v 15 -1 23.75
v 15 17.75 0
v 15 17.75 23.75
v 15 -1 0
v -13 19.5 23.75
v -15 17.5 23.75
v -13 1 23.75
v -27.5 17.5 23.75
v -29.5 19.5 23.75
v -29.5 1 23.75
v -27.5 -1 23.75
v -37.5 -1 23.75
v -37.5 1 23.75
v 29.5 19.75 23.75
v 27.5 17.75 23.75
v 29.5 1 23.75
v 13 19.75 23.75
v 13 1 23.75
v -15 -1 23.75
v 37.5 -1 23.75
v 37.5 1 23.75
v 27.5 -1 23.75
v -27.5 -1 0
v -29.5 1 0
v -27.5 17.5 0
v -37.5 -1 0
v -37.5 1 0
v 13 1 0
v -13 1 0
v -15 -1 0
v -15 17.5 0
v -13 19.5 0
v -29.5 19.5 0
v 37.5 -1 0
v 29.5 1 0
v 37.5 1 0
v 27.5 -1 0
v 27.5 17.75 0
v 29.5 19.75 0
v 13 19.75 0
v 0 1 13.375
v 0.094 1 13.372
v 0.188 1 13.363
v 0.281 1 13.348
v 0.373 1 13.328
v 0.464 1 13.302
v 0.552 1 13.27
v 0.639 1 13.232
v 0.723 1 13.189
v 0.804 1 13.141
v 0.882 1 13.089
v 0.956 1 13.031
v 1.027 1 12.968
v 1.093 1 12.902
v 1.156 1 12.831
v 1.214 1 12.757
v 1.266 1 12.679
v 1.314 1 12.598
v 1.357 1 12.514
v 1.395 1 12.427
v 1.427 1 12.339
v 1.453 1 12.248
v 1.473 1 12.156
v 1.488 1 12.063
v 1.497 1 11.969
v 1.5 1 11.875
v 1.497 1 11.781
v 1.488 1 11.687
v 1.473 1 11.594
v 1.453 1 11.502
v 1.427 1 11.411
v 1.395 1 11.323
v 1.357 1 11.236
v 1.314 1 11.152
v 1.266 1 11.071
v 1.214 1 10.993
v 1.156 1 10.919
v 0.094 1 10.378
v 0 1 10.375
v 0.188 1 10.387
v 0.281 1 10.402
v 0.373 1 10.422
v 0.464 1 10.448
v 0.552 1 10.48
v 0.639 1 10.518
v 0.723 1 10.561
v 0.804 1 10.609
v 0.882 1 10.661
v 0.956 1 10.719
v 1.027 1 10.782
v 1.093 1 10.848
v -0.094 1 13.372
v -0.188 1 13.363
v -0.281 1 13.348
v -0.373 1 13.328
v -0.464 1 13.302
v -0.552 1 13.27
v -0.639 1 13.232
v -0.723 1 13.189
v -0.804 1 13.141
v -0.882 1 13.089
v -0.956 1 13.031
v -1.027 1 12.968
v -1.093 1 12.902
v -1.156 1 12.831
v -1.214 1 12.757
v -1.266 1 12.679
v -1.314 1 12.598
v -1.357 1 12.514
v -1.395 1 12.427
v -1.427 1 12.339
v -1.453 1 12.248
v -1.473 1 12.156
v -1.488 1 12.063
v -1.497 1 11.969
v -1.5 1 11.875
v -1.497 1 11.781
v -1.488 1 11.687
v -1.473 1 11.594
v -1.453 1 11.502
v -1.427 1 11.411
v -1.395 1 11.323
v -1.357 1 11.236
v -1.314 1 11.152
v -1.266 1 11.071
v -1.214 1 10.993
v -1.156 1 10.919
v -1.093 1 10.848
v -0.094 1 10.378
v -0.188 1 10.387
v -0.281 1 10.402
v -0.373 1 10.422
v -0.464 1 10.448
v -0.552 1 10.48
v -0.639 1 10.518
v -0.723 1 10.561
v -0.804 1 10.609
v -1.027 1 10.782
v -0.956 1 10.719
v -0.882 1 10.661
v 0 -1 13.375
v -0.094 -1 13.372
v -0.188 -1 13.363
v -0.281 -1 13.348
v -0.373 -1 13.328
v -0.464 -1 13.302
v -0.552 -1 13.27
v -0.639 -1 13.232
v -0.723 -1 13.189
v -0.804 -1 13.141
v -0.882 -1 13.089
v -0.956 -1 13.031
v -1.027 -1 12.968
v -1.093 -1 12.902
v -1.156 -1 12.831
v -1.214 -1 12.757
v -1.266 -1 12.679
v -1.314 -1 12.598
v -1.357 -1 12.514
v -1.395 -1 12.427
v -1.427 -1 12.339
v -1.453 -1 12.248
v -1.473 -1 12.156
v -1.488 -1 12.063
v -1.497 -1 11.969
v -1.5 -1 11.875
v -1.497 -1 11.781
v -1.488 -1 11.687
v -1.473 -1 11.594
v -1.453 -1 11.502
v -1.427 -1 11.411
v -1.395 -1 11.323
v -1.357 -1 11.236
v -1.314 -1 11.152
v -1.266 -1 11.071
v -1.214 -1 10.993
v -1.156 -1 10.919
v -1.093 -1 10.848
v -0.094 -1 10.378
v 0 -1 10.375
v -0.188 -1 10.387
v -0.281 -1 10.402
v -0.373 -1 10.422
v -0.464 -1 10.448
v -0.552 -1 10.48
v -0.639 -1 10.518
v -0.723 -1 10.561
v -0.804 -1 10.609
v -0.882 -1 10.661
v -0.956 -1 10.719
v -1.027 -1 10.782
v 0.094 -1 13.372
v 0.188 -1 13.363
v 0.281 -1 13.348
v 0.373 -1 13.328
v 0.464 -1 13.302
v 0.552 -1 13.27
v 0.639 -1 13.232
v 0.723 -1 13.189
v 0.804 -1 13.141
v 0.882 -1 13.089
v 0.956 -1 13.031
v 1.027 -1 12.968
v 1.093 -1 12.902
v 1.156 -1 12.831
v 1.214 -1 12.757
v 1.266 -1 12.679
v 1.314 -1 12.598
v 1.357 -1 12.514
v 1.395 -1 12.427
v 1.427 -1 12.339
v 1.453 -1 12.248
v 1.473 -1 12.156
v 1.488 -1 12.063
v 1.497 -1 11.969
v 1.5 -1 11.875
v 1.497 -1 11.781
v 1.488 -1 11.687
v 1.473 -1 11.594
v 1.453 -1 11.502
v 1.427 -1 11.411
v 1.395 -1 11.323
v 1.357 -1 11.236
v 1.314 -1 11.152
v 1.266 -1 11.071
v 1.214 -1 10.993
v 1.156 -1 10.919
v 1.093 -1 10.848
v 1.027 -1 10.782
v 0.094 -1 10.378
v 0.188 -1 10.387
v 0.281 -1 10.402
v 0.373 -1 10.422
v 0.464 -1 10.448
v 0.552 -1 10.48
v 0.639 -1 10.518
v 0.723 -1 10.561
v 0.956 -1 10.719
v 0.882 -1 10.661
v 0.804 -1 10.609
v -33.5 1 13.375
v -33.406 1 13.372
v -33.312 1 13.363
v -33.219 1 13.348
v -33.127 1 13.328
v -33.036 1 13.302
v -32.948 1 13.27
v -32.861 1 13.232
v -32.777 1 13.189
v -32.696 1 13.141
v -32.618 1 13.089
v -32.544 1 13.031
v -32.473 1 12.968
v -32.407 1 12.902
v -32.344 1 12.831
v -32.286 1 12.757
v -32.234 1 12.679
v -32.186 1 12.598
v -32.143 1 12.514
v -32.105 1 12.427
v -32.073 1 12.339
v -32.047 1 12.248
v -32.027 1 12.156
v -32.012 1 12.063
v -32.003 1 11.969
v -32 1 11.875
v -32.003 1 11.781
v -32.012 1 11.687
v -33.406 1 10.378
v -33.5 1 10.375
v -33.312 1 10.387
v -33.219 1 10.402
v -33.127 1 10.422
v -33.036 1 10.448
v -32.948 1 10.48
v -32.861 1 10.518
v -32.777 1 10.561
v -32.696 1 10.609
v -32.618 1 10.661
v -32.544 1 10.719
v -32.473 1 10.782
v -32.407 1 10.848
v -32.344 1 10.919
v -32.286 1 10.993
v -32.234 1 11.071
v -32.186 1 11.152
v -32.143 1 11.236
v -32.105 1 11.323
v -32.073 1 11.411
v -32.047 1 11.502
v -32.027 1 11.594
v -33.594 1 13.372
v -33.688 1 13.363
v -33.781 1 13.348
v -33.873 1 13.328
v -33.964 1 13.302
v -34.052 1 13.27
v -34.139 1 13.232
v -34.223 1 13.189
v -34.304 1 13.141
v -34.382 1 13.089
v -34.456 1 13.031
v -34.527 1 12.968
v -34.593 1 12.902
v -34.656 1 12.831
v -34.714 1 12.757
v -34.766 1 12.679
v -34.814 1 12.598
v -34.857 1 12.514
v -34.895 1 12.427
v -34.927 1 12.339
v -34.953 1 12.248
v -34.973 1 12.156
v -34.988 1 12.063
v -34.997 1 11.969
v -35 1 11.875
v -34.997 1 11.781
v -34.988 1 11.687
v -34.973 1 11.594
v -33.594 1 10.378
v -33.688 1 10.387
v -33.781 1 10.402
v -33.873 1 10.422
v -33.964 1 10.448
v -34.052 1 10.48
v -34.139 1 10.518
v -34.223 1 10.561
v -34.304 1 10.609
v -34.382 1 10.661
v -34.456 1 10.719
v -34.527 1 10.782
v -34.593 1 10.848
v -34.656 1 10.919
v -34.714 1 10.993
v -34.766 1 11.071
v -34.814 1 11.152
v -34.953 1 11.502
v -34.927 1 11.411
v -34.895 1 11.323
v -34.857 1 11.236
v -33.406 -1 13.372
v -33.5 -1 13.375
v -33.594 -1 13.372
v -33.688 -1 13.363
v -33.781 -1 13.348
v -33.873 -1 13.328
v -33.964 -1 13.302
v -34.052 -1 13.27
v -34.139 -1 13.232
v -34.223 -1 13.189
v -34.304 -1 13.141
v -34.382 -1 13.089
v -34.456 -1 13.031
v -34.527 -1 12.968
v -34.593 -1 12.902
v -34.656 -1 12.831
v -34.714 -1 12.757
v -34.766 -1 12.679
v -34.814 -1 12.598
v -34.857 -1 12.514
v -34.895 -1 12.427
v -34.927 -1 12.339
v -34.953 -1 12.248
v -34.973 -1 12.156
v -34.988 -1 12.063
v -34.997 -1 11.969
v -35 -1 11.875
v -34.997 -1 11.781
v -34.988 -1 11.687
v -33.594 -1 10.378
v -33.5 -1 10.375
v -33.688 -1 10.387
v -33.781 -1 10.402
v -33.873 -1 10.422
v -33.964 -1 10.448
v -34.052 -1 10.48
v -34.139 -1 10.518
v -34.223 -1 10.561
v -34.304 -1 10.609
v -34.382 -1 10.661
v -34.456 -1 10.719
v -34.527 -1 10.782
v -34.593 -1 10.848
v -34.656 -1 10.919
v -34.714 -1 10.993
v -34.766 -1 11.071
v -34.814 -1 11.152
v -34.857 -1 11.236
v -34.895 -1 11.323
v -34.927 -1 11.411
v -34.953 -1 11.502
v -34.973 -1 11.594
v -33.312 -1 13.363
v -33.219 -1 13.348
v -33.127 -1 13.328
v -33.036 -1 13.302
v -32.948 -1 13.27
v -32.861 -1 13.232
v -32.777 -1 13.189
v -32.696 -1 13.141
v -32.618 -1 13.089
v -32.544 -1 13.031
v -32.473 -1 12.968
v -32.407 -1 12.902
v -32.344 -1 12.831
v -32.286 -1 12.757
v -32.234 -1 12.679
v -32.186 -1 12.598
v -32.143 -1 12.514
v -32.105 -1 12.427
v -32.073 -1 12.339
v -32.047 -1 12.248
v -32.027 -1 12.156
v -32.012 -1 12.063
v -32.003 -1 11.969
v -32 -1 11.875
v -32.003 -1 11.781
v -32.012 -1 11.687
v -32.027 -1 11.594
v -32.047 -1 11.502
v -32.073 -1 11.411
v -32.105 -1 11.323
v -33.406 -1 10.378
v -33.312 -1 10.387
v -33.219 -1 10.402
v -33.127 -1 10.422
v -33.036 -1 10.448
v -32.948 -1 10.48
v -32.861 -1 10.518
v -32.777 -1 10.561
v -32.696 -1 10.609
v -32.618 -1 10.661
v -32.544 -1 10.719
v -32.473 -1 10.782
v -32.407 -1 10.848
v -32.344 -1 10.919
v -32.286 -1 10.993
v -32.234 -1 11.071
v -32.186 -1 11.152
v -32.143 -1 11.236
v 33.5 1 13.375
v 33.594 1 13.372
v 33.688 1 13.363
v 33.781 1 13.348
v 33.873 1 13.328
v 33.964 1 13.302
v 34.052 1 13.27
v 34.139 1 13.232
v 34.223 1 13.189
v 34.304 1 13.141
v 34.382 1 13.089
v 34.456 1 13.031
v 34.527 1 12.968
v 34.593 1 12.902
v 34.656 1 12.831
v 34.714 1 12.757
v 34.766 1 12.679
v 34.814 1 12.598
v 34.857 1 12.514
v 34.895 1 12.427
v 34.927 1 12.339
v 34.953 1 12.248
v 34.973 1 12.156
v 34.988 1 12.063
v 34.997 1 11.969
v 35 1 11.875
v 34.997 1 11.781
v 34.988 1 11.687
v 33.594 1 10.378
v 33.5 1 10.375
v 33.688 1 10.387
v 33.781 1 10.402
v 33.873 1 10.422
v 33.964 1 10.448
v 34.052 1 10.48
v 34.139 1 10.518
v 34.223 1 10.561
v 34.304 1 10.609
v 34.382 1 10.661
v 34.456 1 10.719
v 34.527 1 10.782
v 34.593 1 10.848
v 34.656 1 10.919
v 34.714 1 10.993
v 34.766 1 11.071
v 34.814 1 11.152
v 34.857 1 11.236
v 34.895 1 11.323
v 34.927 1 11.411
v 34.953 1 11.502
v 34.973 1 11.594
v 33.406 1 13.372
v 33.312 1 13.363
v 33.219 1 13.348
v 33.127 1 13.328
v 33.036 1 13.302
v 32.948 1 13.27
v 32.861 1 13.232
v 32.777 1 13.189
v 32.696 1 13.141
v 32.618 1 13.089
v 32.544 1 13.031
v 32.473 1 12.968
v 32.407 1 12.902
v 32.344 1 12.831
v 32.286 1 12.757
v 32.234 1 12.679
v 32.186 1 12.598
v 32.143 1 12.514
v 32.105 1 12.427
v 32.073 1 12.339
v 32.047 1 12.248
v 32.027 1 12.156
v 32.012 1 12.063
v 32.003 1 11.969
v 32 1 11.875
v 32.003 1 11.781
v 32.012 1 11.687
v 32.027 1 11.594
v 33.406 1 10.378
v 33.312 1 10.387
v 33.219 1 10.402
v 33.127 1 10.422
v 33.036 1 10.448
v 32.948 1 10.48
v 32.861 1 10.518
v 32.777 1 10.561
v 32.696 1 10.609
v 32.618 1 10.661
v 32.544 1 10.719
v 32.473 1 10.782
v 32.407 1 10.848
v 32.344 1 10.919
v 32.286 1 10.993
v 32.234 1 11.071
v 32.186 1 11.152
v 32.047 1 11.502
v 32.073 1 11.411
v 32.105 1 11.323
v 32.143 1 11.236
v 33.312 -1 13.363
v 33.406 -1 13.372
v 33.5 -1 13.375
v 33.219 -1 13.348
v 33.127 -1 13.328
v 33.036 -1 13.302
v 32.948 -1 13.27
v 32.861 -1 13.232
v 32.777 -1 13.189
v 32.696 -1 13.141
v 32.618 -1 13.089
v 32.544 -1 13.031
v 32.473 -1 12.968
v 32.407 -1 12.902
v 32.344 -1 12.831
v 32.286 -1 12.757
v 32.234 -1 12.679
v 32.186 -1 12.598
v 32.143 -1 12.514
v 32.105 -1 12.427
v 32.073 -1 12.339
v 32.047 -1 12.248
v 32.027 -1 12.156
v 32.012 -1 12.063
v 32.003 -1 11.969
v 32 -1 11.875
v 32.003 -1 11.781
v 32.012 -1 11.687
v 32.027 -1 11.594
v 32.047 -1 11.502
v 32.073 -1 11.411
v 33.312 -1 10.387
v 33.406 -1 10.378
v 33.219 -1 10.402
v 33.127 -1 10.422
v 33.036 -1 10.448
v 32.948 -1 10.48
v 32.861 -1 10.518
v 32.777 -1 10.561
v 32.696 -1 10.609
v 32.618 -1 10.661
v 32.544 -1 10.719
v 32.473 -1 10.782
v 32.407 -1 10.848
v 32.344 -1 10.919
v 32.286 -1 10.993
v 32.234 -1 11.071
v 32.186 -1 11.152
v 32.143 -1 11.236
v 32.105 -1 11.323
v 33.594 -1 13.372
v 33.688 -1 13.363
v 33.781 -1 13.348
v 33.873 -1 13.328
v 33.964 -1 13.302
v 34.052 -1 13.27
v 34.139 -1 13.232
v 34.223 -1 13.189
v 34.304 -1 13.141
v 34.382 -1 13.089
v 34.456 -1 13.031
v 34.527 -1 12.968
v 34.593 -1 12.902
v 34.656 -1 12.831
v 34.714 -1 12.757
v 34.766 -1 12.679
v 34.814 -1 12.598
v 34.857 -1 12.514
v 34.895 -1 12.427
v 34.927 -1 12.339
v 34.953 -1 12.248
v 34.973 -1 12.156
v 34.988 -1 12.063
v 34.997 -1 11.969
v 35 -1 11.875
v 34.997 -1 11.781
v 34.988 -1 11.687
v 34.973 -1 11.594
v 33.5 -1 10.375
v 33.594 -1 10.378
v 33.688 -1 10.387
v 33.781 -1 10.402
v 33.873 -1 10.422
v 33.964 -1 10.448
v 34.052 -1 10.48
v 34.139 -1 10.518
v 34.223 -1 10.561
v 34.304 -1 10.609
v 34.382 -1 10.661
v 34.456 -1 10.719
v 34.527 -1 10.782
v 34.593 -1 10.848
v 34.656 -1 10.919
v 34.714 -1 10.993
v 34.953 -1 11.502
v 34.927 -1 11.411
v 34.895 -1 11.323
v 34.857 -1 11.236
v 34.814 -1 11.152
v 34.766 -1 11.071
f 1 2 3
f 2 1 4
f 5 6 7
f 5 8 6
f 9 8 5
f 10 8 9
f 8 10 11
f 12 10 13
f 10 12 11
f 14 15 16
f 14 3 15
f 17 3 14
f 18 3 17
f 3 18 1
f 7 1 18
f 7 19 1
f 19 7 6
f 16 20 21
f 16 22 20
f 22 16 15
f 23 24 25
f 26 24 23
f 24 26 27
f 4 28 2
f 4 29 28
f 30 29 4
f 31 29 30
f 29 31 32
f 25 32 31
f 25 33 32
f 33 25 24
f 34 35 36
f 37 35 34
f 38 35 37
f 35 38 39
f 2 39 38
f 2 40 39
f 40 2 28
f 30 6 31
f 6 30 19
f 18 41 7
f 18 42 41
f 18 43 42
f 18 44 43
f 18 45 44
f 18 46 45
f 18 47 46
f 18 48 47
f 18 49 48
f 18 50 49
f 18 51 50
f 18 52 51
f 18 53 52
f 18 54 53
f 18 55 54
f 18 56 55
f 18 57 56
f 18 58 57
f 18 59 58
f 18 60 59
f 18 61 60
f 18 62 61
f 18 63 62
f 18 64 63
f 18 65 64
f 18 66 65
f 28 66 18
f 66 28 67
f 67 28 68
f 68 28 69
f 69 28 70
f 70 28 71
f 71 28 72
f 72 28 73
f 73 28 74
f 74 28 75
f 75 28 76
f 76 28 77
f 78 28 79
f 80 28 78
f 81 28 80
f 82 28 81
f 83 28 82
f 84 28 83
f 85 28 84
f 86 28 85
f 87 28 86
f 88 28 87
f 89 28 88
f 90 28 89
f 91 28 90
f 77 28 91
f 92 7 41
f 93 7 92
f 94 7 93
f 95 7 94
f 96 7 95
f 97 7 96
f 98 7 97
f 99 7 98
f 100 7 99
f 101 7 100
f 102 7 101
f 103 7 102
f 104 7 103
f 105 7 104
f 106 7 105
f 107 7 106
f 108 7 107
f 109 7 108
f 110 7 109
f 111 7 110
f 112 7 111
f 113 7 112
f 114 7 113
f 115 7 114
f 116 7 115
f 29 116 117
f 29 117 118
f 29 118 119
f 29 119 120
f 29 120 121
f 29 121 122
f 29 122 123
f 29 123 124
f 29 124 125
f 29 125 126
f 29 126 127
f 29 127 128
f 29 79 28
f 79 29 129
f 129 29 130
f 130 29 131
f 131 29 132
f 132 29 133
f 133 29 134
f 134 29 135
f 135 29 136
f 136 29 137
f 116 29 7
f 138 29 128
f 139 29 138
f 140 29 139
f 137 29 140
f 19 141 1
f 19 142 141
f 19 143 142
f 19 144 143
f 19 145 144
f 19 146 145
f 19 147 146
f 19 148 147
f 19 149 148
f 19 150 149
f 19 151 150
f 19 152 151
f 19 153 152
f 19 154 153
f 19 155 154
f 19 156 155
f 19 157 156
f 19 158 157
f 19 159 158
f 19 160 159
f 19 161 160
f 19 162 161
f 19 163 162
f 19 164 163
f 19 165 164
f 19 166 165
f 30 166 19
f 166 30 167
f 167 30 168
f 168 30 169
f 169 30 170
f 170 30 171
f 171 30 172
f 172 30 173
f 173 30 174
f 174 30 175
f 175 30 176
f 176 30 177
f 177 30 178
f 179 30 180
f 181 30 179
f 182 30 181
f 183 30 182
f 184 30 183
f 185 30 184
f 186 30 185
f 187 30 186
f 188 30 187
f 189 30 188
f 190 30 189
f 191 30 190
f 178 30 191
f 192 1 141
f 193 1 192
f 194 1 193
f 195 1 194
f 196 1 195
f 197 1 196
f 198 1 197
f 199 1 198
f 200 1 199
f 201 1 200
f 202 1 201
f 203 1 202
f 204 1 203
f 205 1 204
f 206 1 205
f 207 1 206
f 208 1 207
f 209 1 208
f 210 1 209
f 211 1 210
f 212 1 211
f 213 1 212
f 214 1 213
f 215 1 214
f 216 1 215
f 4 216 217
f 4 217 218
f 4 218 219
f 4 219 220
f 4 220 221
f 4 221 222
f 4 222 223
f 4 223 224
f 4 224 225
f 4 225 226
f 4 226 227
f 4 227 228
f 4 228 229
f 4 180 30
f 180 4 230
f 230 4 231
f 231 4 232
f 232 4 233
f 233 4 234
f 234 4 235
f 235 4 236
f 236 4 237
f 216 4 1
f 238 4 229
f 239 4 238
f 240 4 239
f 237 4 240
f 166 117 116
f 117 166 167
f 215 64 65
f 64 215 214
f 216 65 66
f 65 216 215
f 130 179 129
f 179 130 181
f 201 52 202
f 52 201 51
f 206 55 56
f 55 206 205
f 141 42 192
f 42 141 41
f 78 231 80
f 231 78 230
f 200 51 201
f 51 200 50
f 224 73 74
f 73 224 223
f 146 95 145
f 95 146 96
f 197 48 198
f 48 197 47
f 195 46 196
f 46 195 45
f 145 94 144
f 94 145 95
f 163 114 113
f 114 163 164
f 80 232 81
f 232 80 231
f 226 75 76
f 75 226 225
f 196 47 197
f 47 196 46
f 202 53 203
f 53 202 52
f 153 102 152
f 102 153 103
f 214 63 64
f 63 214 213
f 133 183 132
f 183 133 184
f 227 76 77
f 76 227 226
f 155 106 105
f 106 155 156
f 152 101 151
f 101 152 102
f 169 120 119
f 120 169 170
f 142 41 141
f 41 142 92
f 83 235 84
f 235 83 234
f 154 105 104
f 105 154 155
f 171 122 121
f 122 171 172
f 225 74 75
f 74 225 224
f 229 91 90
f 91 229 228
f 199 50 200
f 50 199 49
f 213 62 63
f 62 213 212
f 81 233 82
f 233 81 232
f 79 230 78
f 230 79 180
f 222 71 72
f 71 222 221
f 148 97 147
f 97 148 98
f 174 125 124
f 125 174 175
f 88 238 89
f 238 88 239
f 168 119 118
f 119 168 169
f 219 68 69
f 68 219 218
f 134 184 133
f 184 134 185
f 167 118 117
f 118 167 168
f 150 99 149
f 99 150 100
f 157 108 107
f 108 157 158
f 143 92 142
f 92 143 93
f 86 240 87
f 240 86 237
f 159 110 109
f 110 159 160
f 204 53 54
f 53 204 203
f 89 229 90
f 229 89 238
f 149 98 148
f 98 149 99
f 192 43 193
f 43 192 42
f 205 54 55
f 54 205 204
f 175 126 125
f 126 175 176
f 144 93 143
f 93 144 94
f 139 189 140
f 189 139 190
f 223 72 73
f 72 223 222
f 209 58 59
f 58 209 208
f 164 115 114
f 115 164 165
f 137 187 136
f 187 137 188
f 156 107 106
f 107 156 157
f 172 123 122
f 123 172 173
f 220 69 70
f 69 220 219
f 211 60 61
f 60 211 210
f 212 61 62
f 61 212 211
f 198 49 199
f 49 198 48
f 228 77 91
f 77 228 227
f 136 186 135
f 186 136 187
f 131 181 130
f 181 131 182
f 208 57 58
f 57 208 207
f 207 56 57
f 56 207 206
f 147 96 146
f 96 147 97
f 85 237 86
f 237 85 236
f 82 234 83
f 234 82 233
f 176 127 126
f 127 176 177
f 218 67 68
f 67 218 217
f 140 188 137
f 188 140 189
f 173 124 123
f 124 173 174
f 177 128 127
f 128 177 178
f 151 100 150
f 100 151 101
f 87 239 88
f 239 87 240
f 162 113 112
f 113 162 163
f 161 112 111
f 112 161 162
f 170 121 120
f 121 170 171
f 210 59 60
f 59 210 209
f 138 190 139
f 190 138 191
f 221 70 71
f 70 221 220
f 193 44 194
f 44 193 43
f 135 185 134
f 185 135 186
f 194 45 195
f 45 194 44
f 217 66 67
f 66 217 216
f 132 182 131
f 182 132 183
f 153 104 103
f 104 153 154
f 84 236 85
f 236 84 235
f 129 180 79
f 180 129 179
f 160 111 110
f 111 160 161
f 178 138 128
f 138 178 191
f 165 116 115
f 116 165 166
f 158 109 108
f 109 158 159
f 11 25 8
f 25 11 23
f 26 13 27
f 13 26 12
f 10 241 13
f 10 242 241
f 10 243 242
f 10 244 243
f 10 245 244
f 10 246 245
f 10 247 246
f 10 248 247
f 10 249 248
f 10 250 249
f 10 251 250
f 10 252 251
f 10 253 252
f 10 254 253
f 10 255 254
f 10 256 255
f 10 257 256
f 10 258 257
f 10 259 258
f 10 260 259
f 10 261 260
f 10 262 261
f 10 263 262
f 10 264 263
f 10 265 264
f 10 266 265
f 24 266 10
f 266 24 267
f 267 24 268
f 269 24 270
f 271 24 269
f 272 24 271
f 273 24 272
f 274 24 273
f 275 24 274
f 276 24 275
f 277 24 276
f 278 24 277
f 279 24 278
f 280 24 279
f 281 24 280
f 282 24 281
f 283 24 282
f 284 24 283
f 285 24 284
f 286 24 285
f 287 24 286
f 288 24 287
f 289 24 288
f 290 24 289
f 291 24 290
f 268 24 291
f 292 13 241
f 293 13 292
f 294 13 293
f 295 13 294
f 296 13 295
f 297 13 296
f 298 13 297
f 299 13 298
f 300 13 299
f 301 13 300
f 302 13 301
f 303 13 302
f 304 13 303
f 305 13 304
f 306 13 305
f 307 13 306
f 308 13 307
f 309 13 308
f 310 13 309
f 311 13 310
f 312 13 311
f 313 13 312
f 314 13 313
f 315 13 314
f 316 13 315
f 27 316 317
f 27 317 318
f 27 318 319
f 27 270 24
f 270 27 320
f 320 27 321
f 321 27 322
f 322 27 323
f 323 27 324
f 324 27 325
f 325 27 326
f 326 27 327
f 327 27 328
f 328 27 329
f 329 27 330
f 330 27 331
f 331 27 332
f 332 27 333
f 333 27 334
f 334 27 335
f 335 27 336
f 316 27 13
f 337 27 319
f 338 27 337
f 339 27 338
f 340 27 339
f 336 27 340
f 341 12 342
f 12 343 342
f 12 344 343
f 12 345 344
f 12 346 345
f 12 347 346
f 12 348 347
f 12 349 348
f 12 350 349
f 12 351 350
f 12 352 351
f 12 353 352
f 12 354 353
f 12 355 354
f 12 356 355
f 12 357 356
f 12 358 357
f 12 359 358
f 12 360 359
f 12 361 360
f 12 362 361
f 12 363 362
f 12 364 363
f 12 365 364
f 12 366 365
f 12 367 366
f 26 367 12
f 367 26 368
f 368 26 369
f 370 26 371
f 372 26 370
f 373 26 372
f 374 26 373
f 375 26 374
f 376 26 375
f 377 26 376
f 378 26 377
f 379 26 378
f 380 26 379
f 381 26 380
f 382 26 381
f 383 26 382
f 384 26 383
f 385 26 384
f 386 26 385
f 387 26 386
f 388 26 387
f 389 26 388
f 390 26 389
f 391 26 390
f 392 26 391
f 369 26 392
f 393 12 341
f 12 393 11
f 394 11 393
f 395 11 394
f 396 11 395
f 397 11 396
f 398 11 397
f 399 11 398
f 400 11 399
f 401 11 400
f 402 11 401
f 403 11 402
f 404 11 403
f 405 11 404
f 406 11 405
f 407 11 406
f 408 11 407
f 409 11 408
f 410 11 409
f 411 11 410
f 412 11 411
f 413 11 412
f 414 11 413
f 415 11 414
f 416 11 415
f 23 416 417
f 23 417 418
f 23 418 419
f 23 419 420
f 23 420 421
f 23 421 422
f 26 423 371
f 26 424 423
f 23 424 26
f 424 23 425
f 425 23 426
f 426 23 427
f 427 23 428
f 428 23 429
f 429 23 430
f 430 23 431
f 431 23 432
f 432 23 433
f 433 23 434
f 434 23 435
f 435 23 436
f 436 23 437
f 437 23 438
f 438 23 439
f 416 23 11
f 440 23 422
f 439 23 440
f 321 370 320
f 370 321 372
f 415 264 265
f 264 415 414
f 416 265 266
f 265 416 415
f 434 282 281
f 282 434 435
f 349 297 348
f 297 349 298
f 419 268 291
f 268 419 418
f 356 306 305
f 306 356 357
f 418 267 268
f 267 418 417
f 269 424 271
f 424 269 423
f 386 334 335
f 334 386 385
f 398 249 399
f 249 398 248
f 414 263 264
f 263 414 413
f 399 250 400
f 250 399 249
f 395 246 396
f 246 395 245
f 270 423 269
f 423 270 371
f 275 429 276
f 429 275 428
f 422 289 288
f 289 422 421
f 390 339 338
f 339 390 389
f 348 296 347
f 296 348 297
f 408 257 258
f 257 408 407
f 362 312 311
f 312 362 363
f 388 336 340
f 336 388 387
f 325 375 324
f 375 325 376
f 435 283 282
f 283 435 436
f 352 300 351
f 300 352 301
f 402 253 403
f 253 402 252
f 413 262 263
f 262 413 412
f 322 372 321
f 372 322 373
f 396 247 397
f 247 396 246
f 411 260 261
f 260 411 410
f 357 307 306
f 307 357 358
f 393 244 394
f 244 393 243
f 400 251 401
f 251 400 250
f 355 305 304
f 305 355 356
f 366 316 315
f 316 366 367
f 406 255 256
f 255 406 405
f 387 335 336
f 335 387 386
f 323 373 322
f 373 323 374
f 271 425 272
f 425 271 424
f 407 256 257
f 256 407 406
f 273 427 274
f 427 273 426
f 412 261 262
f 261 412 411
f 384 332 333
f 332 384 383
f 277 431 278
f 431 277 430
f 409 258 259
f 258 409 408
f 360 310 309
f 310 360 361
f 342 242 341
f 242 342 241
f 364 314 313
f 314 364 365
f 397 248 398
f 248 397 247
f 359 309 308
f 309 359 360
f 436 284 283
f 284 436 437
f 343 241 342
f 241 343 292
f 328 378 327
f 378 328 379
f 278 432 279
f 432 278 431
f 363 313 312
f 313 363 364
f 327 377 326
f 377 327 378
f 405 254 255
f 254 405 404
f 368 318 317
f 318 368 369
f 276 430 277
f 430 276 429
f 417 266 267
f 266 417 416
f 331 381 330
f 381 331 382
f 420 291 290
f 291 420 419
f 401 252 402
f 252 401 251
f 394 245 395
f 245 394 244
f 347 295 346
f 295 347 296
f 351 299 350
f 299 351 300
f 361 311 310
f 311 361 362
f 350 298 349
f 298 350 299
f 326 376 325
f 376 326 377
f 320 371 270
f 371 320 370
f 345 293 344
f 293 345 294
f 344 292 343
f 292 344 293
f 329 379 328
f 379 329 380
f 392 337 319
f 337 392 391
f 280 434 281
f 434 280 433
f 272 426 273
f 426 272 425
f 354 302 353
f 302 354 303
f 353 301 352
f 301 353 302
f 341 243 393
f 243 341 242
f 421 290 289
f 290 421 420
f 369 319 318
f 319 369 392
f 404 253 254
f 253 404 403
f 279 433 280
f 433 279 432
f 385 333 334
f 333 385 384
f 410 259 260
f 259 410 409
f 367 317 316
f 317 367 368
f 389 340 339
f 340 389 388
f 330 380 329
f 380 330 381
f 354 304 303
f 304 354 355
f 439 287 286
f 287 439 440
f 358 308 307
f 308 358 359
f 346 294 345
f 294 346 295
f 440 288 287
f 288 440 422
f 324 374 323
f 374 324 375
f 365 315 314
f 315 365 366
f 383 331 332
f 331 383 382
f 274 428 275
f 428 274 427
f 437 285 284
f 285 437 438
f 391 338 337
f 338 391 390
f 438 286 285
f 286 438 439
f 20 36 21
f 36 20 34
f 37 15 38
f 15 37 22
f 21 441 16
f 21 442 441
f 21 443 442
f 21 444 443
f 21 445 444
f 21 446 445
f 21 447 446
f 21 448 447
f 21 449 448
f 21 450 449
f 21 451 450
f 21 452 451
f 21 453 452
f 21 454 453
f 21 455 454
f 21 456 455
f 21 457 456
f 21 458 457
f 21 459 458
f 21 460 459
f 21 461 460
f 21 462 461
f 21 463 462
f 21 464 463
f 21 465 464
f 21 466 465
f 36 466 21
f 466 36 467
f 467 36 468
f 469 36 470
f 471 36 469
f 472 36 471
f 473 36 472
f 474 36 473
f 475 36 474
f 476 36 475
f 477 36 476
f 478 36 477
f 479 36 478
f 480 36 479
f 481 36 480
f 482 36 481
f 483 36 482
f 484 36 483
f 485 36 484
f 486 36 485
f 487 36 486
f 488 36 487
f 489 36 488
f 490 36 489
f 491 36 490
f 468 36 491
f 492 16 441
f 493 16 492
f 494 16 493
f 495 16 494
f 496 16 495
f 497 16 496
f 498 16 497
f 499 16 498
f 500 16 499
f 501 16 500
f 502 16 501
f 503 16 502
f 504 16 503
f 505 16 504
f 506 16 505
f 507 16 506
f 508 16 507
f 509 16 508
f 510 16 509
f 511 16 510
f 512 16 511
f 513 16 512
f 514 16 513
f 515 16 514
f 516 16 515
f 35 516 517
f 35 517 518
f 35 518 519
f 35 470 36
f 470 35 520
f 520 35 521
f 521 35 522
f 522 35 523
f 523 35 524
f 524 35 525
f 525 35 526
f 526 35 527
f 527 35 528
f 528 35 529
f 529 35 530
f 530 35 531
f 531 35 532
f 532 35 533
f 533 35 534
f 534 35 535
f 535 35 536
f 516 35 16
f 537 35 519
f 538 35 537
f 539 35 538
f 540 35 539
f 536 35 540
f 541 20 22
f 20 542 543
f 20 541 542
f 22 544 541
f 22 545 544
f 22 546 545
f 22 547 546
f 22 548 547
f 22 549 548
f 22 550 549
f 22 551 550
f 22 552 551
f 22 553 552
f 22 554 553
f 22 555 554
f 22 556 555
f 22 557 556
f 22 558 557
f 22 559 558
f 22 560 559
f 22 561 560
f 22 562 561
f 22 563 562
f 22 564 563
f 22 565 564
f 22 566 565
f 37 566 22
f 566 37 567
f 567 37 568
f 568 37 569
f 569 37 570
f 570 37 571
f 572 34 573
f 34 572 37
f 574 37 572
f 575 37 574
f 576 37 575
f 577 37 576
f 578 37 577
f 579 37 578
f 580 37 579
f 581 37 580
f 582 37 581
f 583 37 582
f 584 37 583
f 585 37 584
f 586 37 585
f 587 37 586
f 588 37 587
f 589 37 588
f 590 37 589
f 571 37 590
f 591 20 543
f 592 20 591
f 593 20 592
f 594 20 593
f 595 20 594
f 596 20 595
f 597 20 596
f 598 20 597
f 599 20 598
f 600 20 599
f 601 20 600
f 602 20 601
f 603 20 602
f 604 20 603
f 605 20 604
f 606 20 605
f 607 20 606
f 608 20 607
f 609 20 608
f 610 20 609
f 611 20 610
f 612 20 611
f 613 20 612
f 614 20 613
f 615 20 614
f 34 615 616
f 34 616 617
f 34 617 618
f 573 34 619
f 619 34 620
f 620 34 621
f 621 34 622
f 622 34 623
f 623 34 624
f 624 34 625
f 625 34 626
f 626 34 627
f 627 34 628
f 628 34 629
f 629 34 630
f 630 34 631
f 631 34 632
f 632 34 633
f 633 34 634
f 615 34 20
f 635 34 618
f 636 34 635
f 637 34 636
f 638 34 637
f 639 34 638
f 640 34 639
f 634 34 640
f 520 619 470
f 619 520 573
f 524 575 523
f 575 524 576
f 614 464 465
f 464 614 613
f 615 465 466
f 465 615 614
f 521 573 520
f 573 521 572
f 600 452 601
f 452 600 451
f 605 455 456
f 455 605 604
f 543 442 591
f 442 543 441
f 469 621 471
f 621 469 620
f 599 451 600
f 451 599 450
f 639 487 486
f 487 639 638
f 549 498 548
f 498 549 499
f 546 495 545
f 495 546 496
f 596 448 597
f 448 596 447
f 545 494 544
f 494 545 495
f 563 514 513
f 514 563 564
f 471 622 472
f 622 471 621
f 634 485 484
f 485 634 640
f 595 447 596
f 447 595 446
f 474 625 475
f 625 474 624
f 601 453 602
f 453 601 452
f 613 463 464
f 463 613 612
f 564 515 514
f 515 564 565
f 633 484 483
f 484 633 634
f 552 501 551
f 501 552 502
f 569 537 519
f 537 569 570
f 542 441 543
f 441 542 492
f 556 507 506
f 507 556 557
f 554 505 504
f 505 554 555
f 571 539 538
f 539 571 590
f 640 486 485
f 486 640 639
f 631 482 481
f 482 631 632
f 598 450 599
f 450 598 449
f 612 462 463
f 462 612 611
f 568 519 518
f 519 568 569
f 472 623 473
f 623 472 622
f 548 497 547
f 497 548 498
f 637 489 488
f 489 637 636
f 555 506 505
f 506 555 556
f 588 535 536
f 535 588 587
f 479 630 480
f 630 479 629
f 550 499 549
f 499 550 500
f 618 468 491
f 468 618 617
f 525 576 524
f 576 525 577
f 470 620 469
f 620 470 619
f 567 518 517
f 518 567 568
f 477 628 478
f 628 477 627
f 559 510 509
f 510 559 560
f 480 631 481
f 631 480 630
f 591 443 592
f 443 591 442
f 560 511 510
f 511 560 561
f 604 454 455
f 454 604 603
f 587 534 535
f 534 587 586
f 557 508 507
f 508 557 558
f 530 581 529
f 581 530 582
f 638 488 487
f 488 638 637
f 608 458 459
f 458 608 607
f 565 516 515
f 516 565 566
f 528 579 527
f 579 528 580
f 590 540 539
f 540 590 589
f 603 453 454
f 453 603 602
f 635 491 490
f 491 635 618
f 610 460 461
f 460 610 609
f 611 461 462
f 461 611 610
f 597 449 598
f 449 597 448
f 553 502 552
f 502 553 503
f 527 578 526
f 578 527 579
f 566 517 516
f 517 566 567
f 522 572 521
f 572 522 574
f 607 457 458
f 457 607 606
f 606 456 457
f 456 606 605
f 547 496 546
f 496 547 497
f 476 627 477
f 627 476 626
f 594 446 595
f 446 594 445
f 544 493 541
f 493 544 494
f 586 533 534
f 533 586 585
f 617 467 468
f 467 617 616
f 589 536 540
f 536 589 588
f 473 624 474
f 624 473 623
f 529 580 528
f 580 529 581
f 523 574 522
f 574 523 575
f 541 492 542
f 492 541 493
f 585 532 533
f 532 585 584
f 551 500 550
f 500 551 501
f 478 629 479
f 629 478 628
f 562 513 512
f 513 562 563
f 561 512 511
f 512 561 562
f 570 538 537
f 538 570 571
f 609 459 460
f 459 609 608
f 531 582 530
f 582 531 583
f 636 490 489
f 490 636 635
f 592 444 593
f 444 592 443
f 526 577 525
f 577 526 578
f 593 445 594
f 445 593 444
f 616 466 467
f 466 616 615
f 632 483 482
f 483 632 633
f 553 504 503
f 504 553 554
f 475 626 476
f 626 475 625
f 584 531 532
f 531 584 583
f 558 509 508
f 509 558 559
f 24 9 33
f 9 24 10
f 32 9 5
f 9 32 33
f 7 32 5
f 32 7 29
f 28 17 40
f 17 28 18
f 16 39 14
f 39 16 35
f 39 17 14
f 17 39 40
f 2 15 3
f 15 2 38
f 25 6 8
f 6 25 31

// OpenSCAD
//%import("C:/Users/UO251069/Desktop/ServoBrace.stl");

module ServoBraze(){

difference(){
    translate([-15,-1,0])
    cube([30,2,23.75]);
    
    rotate([90,0,0])
    translate([0,11.875,-3])
    cylinder(h=5,d=3,$fn=100);
}



difference(){
    translate([-37.5,-1,0])
    cube([10,2,23.75]);
    
    rotate([90,0,0])
    translate([-33.5,11.875,-3])
    cylinder(h=5,d=3,$fn=100);
}

difference(){
    translate([27.5,-1,0])
    cube([10,2,23.75]);
    
    rotate([90,0,0])
    translate([33.5,11.875,-3])
    cylinder(h=5,d=3,$fn=100);
}

rotate([0,0,90])
translate([-1,27.5,0])
cube([20.5,2,23.75]);

rotate([0,0,90])
translate([-1,13,0])
cube([20.5,2,23.75]);

rotate([0,0,90])
translate([-1,-15,0])
cube([20.5,2,23.75]);

rotate([0,0,90])
translate([-1,-29.5,0])
cube([20.5,2,23.75]);

translate([13,17.75,0])
cube([16.5,2,23.75]);

translate([-29.5,17.5,0])
cube([16.5,2,23.75]);
}

ServoBraze();
